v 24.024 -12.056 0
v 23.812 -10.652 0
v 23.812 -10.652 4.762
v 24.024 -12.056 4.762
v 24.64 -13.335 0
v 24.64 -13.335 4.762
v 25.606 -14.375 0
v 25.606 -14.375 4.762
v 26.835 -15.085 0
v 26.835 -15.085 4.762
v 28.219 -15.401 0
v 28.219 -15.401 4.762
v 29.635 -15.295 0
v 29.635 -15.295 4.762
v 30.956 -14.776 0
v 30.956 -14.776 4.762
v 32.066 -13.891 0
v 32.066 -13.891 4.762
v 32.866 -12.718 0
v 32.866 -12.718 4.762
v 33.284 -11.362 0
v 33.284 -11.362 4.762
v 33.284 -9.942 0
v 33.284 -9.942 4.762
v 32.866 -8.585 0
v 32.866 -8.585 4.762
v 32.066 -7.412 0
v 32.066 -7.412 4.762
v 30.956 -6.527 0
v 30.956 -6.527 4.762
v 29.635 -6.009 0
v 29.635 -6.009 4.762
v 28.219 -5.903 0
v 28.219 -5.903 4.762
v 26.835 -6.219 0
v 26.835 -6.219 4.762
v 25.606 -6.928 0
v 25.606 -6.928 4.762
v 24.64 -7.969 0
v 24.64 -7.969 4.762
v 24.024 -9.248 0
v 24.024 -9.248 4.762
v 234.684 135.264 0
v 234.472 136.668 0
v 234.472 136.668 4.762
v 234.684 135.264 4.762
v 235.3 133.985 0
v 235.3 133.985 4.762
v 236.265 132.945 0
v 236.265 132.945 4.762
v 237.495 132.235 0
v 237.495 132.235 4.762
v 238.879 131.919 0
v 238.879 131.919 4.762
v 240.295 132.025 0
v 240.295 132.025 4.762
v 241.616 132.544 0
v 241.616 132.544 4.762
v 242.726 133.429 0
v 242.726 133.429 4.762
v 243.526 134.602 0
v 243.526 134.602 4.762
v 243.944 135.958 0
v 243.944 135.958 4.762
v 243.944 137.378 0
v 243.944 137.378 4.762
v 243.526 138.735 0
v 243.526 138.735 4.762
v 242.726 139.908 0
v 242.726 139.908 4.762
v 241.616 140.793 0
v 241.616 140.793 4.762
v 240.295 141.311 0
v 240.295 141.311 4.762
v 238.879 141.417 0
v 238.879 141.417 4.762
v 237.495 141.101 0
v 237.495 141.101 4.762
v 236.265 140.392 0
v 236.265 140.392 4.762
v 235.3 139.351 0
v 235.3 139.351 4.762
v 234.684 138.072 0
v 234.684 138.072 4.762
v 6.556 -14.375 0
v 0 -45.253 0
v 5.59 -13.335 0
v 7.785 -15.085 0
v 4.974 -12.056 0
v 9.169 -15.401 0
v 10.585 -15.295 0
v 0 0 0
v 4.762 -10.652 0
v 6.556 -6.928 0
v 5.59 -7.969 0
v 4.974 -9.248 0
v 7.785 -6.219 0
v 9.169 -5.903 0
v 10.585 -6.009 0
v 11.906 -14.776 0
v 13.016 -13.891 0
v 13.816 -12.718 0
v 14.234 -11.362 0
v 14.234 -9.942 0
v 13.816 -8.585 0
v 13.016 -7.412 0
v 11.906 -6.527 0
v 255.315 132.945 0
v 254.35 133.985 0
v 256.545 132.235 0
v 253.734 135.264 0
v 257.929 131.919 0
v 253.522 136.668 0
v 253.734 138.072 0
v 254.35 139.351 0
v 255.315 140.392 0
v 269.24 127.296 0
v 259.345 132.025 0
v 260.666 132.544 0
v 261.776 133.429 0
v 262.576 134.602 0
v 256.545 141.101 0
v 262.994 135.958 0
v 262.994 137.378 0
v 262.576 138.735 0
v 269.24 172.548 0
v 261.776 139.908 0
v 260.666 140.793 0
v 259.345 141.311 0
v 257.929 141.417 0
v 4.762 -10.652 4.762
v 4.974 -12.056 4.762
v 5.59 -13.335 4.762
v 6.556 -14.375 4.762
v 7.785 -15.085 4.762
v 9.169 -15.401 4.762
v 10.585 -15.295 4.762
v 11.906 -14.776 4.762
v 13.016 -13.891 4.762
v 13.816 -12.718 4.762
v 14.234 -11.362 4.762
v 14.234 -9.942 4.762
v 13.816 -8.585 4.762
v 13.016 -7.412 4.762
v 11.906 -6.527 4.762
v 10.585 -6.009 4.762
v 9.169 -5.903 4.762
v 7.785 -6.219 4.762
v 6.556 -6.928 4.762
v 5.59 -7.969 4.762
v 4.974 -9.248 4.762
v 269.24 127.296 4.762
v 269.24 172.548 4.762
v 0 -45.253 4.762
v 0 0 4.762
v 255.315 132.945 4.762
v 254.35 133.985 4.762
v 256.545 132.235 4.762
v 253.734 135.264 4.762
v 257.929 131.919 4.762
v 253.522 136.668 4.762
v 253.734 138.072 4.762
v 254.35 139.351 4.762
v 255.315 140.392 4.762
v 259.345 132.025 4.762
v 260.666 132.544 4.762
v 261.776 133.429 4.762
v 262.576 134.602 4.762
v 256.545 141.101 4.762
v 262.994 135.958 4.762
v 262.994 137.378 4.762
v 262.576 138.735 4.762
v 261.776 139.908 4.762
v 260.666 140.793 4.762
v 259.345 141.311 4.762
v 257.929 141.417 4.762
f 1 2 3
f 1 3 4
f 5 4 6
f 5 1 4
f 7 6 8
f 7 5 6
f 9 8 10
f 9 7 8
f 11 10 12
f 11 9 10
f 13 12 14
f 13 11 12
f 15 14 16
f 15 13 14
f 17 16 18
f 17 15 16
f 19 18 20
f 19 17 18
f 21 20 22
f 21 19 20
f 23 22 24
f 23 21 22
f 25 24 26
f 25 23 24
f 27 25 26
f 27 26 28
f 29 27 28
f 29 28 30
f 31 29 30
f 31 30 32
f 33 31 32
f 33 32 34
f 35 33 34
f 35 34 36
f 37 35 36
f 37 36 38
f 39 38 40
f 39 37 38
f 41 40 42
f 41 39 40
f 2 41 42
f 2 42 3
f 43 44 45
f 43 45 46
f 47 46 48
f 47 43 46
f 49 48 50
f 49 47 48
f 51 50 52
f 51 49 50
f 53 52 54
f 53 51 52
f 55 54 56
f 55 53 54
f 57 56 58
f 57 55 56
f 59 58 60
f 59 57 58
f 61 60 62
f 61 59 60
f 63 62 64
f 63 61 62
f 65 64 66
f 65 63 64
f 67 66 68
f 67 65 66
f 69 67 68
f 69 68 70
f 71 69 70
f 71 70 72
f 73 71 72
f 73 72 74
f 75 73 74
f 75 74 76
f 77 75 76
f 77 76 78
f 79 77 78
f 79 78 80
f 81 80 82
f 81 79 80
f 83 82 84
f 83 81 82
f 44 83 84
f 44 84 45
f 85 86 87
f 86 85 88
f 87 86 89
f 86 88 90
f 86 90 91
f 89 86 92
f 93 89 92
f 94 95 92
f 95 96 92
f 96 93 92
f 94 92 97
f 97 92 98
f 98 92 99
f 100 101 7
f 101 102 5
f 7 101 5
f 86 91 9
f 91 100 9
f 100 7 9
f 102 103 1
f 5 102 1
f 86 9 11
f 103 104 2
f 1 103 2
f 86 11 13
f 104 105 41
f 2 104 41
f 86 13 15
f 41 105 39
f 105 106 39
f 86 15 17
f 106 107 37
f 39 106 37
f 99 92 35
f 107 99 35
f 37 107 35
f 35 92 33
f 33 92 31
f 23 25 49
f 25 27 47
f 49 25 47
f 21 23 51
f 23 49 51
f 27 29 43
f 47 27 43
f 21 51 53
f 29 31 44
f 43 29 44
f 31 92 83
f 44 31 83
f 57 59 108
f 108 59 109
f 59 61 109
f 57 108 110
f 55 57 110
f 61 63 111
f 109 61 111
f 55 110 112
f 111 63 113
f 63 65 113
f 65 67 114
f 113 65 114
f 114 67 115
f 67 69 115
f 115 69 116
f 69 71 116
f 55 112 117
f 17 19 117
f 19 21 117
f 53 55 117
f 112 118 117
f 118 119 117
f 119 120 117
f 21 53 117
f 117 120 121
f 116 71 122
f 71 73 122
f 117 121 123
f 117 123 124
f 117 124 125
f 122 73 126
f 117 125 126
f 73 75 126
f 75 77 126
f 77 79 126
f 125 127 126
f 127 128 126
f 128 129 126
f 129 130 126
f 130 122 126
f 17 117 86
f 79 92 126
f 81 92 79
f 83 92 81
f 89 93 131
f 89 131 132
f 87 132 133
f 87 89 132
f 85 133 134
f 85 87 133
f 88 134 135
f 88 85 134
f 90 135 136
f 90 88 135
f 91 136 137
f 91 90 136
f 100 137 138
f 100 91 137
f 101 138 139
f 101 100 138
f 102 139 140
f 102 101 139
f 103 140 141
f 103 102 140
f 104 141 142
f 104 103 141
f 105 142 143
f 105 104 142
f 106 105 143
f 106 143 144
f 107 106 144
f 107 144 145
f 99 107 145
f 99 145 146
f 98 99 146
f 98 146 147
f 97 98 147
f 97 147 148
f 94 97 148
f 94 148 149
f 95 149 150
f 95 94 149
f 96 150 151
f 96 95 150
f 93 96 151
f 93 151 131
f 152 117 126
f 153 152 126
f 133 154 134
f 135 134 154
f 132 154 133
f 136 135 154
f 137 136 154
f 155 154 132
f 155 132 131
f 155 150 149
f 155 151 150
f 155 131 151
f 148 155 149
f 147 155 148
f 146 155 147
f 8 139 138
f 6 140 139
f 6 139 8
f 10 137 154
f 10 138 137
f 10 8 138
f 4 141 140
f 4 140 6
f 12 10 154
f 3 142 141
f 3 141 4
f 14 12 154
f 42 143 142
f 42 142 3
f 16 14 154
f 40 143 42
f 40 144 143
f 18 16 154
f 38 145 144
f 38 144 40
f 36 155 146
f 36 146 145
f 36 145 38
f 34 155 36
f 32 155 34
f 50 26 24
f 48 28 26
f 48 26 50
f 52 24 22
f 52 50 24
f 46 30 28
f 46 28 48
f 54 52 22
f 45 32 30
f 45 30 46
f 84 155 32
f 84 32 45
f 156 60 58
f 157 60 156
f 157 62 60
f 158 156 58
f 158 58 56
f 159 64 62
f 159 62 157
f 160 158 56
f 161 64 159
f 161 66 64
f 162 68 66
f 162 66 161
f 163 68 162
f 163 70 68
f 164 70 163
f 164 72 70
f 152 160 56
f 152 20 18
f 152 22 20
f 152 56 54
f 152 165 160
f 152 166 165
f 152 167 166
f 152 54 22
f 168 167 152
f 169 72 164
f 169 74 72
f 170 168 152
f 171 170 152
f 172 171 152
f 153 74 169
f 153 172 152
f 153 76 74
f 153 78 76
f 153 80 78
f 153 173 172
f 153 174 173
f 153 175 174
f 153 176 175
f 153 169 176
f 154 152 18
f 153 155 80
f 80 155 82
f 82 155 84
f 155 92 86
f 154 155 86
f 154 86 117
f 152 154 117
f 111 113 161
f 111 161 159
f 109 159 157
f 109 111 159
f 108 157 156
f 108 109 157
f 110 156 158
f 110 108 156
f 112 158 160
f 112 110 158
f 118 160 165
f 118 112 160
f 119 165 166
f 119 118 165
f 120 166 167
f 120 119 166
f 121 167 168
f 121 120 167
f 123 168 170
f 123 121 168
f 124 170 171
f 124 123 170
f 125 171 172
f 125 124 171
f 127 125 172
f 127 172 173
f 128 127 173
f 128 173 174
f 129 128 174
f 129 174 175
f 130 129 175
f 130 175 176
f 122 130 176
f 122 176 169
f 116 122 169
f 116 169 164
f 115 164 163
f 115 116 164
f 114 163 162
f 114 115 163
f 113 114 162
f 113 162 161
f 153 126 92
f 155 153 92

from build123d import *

# Parameters (mm, degrees)
SKETCH1_R           = 4.7625
BOSS_EXTRUDE1_DEPTH = 4.7625


with BuildPart() as part:
    # Sketch1 → Boss-Extrude1 (new body)
    with BuildSketch(Plane.XY):
        Polygon((0, 0), (0, -45.252735849), (269.24, 127.295542021), (269.24, 172.54827787), align=None)
        with Locations(Location((9.525, -10.651818651, 0), (0, 0, 180))):
            Circle(SKETCH1_R, mode=Mode.SUBTRACT)
        with Locations(Location((28.575, -10.651818651, 0), (0, 0, 180))):
            Circle(SKETCH1_R, mode=Mode.SUBTRACT)
        with Locations(Location((239.234787134, 136.668181349, 0), (0, 0, 180))):
            Circle(SKETCH1_R, mode=Mode.SUBTRACT)
        with Locations(Location((258.284787134, 136.668181349, 0), (0, 0, 180))):
            Circle(SKETCH1_R, mode=Mode.SUBTRACT)
    extrude(amount=BOSS_EXTRUDE1_DEPTH)


solid = part.part
